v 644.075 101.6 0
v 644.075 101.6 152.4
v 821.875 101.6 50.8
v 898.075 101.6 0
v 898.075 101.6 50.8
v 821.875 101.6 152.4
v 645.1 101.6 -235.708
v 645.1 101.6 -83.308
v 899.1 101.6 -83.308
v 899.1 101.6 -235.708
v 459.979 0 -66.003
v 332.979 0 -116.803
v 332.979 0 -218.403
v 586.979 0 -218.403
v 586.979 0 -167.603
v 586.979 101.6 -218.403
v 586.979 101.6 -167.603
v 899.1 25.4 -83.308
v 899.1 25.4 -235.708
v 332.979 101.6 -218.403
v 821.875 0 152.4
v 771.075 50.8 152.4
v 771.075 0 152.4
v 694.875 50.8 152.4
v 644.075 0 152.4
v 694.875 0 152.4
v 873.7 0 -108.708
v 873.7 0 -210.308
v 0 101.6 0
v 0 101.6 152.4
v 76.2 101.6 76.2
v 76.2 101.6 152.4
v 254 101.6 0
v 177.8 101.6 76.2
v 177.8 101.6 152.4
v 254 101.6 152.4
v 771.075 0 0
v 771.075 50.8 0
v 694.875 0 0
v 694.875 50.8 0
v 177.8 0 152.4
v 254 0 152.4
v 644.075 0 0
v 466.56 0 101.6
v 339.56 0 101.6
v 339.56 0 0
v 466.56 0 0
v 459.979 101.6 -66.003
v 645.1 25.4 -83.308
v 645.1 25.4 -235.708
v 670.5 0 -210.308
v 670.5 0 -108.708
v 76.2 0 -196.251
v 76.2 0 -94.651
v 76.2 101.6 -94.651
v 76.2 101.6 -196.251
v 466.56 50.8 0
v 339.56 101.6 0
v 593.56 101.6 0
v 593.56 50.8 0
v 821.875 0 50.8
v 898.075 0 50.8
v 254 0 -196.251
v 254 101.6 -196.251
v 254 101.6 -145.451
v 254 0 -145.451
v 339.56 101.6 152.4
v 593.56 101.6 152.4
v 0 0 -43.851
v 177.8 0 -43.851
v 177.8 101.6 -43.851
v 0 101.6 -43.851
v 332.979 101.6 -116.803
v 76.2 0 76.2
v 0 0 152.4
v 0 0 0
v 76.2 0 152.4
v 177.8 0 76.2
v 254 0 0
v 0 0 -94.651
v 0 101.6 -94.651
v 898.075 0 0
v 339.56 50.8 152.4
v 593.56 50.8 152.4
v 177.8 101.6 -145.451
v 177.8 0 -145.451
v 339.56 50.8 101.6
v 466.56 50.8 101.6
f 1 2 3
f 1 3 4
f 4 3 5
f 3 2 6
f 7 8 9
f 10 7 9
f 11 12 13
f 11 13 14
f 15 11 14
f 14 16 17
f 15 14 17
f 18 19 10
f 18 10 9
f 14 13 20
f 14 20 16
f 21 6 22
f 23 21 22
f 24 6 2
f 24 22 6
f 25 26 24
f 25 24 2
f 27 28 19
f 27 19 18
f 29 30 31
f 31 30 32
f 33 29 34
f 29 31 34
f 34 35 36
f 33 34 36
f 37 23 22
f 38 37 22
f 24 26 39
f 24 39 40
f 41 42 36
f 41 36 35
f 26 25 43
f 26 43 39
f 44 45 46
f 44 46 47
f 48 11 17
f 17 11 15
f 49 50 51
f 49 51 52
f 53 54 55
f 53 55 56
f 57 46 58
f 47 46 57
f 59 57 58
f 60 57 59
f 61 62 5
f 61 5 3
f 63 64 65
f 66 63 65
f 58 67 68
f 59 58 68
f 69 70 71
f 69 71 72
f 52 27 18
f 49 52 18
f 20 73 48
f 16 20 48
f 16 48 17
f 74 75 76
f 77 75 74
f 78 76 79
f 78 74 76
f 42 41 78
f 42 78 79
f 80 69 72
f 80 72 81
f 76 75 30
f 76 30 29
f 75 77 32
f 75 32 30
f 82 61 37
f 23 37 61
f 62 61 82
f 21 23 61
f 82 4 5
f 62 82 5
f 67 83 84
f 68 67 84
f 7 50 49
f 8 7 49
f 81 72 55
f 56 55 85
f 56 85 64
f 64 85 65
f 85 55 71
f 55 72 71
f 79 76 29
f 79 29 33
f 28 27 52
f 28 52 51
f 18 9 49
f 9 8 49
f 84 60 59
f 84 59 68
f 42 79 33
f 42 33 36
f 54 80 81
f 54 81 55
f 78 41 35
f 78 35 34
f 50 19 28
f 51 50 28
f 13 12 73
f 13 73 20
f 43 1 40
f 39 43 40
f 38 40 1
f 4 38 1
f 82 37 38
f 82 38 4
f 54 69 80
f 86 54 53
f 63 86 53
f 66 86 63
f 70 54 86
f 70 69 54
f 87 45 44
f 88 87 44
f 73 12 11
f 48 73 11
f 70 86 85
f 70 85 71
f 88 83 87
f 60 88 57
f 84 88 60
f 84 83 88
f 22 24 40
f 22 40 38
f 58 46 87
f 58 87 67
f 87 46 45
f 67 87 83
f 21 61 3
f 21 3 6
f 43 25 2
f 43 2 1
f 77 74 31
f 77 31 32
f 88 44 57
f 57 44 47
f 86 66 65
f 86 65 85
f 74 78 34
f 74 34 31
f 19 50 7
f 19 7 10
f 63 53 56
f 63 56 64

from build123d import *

# Parameters (mm, degrees)
F1_DEPTH  = 101.6
F2_W      = 254
F2_H      = 152.4
F3_DEPTH  = 101.6
F5_DEPTH  = 50.8
F7_DEPTH  = 101.6
F8_W      = 76.2
F8_H      = 50.8
F9_DEPTH  = 152.4
F11_DEPTH = 101.6
F13_DEPTH = 101.6
F15_DEPTH = 101.6
F17_DEPTH = 101.6
F18_W     = 254
F18_H     = 152.4
F19_DEPTH = 101.6
F21_DEPTH = 254
F23_DEPTH = 254
F24_DEPTH = 508
F25_SIZE  = 25.4
F26_SIZE  = 25.4


with BuildPart() as f1:
    # F0 (on Front) → F1 (new body)
    with BuildSketch(Plane.XZ):
        Polygon((0, 152.4), (0, 0), (254, 0), (254, 152.4), (177.8, 152.4), (177.8, 76.2), (76.2, 76.2), (76.2, 152.4), align=None)
    extrude(amount=-F1_DEPTH)


with BuildPart() as f3:
    # F2 (on Front) → F3 (new body)
    with BuildSketch(Plane.XZ):
        with Locations((466.5595419312, 76.2)):
            Rectangle(F2_W, F2_H)
    extrude(amount=-F3_DEPTH)

    # F4 (on face) → F5 (cut)
    with BuildSketch(Plane.XZ):
        Polygon((339.5595419312, 152.4), (339.5595419312, 101.6), (466.5595419312, 101.6), (466.5595419312, 0), (593.5595419312, 0), (593.5595419312, 152.4), align=None)
    extrude(amount=-F5_DEPTH, mode=Mode.SUBTRACT)


with BuildPart() as f7:
    # F6 (on Front) → F7 (new body)
    with BuildSketch(Plane.XZ):
        Polygon((644.0749381992, 152.4), (644.0749381992, 0), (898.0749381992, 0), (898.0749381992, 50.8), (821.8749381992, 50.8), (821.8749381992, 152.4), align=None)
    extrude(amount=-F7_DEPTH)

    # F8 (on face) → F9 (cut)
    with BuildSketch(Plane.XY.offset(152.4)):
        with Locations((732.9749381992, 25.4)):
            Rectangle(F8_W, F8_H)
    extrude(amount=-F9_DEPTH, mode=Mode.SUBTRACT)


with BuildPart() as f11:
    # F10 (on Front) → F11 (new body)
    with BuildSketch(Plane.XZ):
        Polygon((177.8, -43.8514465817), (0, -43.8514465817), (0, -94.6514465817), (76.2, -94.6514465817), (76.2, -196.2514465817), (254, -196.2514465817), (254, -145.4514465817), (177.8, -145.4514465817), align=None)
    extrude(amount=-F11_DEPTH)


with BuildPart() as f13:
    # F12 (on Front) → F13 (new body)
    with BuildSketch(Plane.XZ):
        Polygon((459.9786102772, -66.0025836769), (332.9786102772, -66.0025836769), (332.9786102772, -116.8025836769), align=None)
        Polygon((586.9786102772, -66.0025836769), (459.9786102772, -66.0025836769), (586.9786102772, -167.6025836769), align=None)
        Polygon((586.9786102772, -167.6025836769), (459.9786102772, -66.0025836769), (332.9786102772, -116.8025836769), (332.9786102772, -218.4025836769), (586.9786102772, -218.4025836769), align=None)
    extrude(amount=-F13_DEPTH)

    # F14 (on face) → F15 (cut)
    with BuildSketch(Plane.XZ):
        Polygon((332.9786102772, -66.0025836769), (332.9786102772, -116.8025836769), (459.9786102772, -66.0025836769), align=None)
    extrude(amount=-F15_DEPTH, mode=Mode.SUBTRACT)

    # F16 (on face) → F17 (cut)
    with BuildSketch(Plane.XZ):
        Polygon((459.9786102772, -66.0025836769), (586.9786102772, -167.6025836769), (586.9786102772, -66.0025836769), align=None)
    extrude(amount=-F17_DEPTH, mode=Mode.SUBTRACT)


with BuildPart() as f19:
    # F18 (on Front) → F19 (new body)
    with BuildSketch(Plane.XZ):
        with Locations((772.1001505852, -159.5083741897)):
            Rectangle(F18_W, F18_H)
    extrude(amount=-F19_DEPTH)

    # F20 (on face) → F21 (cut)
    with BuildSketch(Plane.YZ.offset(899.1001505852)):
        Polygon((25.4, -235.7083741897), (0, -210.3083741897), (0, -235.7083741897), align=None)
    extrude(amount=-F21_DEPTH, mode=Mode.SUBTRACT)

    # F22 (on face) → F23 (join)
    with BuildSketch(Plane.YZ.offset(899.1001505852)):
        Polygon((0, -108.7083741897), (25.4, -83.3083741897), (0, -83.3083741897), align=None)
    extrude(amount=F23_DEPTH)

    # F24 (cut): a face of the model
    f24_faces = [f19.faces().sort_by_distance(p)[0] for p in [
        (1153.1001505852, 8.4666666667, -91.7750408563),
    ]]
    extrude(f24_faces, amount=-F24_DEPTH, mode=Mode.SUBTRACT)

    # F25
    f25_edges = [f19.edges().sort_by_distance(p)[0] for p in [
        (899.100151, 0, -159.508374),
    ]]
    chamfer(f25_edges, length=F25_SIZE)

    # F26
    f26_edges = [f19.edges().sort_by_distance(p)[0] for p in [
        (645.100151, 0, -159.508374),
    ]]
    chamfer(f26_edges, length=F26_SIZE)


solid = Compound([f1.part, f3.part, f7.part, f11.part, f13.part, f19.part])
